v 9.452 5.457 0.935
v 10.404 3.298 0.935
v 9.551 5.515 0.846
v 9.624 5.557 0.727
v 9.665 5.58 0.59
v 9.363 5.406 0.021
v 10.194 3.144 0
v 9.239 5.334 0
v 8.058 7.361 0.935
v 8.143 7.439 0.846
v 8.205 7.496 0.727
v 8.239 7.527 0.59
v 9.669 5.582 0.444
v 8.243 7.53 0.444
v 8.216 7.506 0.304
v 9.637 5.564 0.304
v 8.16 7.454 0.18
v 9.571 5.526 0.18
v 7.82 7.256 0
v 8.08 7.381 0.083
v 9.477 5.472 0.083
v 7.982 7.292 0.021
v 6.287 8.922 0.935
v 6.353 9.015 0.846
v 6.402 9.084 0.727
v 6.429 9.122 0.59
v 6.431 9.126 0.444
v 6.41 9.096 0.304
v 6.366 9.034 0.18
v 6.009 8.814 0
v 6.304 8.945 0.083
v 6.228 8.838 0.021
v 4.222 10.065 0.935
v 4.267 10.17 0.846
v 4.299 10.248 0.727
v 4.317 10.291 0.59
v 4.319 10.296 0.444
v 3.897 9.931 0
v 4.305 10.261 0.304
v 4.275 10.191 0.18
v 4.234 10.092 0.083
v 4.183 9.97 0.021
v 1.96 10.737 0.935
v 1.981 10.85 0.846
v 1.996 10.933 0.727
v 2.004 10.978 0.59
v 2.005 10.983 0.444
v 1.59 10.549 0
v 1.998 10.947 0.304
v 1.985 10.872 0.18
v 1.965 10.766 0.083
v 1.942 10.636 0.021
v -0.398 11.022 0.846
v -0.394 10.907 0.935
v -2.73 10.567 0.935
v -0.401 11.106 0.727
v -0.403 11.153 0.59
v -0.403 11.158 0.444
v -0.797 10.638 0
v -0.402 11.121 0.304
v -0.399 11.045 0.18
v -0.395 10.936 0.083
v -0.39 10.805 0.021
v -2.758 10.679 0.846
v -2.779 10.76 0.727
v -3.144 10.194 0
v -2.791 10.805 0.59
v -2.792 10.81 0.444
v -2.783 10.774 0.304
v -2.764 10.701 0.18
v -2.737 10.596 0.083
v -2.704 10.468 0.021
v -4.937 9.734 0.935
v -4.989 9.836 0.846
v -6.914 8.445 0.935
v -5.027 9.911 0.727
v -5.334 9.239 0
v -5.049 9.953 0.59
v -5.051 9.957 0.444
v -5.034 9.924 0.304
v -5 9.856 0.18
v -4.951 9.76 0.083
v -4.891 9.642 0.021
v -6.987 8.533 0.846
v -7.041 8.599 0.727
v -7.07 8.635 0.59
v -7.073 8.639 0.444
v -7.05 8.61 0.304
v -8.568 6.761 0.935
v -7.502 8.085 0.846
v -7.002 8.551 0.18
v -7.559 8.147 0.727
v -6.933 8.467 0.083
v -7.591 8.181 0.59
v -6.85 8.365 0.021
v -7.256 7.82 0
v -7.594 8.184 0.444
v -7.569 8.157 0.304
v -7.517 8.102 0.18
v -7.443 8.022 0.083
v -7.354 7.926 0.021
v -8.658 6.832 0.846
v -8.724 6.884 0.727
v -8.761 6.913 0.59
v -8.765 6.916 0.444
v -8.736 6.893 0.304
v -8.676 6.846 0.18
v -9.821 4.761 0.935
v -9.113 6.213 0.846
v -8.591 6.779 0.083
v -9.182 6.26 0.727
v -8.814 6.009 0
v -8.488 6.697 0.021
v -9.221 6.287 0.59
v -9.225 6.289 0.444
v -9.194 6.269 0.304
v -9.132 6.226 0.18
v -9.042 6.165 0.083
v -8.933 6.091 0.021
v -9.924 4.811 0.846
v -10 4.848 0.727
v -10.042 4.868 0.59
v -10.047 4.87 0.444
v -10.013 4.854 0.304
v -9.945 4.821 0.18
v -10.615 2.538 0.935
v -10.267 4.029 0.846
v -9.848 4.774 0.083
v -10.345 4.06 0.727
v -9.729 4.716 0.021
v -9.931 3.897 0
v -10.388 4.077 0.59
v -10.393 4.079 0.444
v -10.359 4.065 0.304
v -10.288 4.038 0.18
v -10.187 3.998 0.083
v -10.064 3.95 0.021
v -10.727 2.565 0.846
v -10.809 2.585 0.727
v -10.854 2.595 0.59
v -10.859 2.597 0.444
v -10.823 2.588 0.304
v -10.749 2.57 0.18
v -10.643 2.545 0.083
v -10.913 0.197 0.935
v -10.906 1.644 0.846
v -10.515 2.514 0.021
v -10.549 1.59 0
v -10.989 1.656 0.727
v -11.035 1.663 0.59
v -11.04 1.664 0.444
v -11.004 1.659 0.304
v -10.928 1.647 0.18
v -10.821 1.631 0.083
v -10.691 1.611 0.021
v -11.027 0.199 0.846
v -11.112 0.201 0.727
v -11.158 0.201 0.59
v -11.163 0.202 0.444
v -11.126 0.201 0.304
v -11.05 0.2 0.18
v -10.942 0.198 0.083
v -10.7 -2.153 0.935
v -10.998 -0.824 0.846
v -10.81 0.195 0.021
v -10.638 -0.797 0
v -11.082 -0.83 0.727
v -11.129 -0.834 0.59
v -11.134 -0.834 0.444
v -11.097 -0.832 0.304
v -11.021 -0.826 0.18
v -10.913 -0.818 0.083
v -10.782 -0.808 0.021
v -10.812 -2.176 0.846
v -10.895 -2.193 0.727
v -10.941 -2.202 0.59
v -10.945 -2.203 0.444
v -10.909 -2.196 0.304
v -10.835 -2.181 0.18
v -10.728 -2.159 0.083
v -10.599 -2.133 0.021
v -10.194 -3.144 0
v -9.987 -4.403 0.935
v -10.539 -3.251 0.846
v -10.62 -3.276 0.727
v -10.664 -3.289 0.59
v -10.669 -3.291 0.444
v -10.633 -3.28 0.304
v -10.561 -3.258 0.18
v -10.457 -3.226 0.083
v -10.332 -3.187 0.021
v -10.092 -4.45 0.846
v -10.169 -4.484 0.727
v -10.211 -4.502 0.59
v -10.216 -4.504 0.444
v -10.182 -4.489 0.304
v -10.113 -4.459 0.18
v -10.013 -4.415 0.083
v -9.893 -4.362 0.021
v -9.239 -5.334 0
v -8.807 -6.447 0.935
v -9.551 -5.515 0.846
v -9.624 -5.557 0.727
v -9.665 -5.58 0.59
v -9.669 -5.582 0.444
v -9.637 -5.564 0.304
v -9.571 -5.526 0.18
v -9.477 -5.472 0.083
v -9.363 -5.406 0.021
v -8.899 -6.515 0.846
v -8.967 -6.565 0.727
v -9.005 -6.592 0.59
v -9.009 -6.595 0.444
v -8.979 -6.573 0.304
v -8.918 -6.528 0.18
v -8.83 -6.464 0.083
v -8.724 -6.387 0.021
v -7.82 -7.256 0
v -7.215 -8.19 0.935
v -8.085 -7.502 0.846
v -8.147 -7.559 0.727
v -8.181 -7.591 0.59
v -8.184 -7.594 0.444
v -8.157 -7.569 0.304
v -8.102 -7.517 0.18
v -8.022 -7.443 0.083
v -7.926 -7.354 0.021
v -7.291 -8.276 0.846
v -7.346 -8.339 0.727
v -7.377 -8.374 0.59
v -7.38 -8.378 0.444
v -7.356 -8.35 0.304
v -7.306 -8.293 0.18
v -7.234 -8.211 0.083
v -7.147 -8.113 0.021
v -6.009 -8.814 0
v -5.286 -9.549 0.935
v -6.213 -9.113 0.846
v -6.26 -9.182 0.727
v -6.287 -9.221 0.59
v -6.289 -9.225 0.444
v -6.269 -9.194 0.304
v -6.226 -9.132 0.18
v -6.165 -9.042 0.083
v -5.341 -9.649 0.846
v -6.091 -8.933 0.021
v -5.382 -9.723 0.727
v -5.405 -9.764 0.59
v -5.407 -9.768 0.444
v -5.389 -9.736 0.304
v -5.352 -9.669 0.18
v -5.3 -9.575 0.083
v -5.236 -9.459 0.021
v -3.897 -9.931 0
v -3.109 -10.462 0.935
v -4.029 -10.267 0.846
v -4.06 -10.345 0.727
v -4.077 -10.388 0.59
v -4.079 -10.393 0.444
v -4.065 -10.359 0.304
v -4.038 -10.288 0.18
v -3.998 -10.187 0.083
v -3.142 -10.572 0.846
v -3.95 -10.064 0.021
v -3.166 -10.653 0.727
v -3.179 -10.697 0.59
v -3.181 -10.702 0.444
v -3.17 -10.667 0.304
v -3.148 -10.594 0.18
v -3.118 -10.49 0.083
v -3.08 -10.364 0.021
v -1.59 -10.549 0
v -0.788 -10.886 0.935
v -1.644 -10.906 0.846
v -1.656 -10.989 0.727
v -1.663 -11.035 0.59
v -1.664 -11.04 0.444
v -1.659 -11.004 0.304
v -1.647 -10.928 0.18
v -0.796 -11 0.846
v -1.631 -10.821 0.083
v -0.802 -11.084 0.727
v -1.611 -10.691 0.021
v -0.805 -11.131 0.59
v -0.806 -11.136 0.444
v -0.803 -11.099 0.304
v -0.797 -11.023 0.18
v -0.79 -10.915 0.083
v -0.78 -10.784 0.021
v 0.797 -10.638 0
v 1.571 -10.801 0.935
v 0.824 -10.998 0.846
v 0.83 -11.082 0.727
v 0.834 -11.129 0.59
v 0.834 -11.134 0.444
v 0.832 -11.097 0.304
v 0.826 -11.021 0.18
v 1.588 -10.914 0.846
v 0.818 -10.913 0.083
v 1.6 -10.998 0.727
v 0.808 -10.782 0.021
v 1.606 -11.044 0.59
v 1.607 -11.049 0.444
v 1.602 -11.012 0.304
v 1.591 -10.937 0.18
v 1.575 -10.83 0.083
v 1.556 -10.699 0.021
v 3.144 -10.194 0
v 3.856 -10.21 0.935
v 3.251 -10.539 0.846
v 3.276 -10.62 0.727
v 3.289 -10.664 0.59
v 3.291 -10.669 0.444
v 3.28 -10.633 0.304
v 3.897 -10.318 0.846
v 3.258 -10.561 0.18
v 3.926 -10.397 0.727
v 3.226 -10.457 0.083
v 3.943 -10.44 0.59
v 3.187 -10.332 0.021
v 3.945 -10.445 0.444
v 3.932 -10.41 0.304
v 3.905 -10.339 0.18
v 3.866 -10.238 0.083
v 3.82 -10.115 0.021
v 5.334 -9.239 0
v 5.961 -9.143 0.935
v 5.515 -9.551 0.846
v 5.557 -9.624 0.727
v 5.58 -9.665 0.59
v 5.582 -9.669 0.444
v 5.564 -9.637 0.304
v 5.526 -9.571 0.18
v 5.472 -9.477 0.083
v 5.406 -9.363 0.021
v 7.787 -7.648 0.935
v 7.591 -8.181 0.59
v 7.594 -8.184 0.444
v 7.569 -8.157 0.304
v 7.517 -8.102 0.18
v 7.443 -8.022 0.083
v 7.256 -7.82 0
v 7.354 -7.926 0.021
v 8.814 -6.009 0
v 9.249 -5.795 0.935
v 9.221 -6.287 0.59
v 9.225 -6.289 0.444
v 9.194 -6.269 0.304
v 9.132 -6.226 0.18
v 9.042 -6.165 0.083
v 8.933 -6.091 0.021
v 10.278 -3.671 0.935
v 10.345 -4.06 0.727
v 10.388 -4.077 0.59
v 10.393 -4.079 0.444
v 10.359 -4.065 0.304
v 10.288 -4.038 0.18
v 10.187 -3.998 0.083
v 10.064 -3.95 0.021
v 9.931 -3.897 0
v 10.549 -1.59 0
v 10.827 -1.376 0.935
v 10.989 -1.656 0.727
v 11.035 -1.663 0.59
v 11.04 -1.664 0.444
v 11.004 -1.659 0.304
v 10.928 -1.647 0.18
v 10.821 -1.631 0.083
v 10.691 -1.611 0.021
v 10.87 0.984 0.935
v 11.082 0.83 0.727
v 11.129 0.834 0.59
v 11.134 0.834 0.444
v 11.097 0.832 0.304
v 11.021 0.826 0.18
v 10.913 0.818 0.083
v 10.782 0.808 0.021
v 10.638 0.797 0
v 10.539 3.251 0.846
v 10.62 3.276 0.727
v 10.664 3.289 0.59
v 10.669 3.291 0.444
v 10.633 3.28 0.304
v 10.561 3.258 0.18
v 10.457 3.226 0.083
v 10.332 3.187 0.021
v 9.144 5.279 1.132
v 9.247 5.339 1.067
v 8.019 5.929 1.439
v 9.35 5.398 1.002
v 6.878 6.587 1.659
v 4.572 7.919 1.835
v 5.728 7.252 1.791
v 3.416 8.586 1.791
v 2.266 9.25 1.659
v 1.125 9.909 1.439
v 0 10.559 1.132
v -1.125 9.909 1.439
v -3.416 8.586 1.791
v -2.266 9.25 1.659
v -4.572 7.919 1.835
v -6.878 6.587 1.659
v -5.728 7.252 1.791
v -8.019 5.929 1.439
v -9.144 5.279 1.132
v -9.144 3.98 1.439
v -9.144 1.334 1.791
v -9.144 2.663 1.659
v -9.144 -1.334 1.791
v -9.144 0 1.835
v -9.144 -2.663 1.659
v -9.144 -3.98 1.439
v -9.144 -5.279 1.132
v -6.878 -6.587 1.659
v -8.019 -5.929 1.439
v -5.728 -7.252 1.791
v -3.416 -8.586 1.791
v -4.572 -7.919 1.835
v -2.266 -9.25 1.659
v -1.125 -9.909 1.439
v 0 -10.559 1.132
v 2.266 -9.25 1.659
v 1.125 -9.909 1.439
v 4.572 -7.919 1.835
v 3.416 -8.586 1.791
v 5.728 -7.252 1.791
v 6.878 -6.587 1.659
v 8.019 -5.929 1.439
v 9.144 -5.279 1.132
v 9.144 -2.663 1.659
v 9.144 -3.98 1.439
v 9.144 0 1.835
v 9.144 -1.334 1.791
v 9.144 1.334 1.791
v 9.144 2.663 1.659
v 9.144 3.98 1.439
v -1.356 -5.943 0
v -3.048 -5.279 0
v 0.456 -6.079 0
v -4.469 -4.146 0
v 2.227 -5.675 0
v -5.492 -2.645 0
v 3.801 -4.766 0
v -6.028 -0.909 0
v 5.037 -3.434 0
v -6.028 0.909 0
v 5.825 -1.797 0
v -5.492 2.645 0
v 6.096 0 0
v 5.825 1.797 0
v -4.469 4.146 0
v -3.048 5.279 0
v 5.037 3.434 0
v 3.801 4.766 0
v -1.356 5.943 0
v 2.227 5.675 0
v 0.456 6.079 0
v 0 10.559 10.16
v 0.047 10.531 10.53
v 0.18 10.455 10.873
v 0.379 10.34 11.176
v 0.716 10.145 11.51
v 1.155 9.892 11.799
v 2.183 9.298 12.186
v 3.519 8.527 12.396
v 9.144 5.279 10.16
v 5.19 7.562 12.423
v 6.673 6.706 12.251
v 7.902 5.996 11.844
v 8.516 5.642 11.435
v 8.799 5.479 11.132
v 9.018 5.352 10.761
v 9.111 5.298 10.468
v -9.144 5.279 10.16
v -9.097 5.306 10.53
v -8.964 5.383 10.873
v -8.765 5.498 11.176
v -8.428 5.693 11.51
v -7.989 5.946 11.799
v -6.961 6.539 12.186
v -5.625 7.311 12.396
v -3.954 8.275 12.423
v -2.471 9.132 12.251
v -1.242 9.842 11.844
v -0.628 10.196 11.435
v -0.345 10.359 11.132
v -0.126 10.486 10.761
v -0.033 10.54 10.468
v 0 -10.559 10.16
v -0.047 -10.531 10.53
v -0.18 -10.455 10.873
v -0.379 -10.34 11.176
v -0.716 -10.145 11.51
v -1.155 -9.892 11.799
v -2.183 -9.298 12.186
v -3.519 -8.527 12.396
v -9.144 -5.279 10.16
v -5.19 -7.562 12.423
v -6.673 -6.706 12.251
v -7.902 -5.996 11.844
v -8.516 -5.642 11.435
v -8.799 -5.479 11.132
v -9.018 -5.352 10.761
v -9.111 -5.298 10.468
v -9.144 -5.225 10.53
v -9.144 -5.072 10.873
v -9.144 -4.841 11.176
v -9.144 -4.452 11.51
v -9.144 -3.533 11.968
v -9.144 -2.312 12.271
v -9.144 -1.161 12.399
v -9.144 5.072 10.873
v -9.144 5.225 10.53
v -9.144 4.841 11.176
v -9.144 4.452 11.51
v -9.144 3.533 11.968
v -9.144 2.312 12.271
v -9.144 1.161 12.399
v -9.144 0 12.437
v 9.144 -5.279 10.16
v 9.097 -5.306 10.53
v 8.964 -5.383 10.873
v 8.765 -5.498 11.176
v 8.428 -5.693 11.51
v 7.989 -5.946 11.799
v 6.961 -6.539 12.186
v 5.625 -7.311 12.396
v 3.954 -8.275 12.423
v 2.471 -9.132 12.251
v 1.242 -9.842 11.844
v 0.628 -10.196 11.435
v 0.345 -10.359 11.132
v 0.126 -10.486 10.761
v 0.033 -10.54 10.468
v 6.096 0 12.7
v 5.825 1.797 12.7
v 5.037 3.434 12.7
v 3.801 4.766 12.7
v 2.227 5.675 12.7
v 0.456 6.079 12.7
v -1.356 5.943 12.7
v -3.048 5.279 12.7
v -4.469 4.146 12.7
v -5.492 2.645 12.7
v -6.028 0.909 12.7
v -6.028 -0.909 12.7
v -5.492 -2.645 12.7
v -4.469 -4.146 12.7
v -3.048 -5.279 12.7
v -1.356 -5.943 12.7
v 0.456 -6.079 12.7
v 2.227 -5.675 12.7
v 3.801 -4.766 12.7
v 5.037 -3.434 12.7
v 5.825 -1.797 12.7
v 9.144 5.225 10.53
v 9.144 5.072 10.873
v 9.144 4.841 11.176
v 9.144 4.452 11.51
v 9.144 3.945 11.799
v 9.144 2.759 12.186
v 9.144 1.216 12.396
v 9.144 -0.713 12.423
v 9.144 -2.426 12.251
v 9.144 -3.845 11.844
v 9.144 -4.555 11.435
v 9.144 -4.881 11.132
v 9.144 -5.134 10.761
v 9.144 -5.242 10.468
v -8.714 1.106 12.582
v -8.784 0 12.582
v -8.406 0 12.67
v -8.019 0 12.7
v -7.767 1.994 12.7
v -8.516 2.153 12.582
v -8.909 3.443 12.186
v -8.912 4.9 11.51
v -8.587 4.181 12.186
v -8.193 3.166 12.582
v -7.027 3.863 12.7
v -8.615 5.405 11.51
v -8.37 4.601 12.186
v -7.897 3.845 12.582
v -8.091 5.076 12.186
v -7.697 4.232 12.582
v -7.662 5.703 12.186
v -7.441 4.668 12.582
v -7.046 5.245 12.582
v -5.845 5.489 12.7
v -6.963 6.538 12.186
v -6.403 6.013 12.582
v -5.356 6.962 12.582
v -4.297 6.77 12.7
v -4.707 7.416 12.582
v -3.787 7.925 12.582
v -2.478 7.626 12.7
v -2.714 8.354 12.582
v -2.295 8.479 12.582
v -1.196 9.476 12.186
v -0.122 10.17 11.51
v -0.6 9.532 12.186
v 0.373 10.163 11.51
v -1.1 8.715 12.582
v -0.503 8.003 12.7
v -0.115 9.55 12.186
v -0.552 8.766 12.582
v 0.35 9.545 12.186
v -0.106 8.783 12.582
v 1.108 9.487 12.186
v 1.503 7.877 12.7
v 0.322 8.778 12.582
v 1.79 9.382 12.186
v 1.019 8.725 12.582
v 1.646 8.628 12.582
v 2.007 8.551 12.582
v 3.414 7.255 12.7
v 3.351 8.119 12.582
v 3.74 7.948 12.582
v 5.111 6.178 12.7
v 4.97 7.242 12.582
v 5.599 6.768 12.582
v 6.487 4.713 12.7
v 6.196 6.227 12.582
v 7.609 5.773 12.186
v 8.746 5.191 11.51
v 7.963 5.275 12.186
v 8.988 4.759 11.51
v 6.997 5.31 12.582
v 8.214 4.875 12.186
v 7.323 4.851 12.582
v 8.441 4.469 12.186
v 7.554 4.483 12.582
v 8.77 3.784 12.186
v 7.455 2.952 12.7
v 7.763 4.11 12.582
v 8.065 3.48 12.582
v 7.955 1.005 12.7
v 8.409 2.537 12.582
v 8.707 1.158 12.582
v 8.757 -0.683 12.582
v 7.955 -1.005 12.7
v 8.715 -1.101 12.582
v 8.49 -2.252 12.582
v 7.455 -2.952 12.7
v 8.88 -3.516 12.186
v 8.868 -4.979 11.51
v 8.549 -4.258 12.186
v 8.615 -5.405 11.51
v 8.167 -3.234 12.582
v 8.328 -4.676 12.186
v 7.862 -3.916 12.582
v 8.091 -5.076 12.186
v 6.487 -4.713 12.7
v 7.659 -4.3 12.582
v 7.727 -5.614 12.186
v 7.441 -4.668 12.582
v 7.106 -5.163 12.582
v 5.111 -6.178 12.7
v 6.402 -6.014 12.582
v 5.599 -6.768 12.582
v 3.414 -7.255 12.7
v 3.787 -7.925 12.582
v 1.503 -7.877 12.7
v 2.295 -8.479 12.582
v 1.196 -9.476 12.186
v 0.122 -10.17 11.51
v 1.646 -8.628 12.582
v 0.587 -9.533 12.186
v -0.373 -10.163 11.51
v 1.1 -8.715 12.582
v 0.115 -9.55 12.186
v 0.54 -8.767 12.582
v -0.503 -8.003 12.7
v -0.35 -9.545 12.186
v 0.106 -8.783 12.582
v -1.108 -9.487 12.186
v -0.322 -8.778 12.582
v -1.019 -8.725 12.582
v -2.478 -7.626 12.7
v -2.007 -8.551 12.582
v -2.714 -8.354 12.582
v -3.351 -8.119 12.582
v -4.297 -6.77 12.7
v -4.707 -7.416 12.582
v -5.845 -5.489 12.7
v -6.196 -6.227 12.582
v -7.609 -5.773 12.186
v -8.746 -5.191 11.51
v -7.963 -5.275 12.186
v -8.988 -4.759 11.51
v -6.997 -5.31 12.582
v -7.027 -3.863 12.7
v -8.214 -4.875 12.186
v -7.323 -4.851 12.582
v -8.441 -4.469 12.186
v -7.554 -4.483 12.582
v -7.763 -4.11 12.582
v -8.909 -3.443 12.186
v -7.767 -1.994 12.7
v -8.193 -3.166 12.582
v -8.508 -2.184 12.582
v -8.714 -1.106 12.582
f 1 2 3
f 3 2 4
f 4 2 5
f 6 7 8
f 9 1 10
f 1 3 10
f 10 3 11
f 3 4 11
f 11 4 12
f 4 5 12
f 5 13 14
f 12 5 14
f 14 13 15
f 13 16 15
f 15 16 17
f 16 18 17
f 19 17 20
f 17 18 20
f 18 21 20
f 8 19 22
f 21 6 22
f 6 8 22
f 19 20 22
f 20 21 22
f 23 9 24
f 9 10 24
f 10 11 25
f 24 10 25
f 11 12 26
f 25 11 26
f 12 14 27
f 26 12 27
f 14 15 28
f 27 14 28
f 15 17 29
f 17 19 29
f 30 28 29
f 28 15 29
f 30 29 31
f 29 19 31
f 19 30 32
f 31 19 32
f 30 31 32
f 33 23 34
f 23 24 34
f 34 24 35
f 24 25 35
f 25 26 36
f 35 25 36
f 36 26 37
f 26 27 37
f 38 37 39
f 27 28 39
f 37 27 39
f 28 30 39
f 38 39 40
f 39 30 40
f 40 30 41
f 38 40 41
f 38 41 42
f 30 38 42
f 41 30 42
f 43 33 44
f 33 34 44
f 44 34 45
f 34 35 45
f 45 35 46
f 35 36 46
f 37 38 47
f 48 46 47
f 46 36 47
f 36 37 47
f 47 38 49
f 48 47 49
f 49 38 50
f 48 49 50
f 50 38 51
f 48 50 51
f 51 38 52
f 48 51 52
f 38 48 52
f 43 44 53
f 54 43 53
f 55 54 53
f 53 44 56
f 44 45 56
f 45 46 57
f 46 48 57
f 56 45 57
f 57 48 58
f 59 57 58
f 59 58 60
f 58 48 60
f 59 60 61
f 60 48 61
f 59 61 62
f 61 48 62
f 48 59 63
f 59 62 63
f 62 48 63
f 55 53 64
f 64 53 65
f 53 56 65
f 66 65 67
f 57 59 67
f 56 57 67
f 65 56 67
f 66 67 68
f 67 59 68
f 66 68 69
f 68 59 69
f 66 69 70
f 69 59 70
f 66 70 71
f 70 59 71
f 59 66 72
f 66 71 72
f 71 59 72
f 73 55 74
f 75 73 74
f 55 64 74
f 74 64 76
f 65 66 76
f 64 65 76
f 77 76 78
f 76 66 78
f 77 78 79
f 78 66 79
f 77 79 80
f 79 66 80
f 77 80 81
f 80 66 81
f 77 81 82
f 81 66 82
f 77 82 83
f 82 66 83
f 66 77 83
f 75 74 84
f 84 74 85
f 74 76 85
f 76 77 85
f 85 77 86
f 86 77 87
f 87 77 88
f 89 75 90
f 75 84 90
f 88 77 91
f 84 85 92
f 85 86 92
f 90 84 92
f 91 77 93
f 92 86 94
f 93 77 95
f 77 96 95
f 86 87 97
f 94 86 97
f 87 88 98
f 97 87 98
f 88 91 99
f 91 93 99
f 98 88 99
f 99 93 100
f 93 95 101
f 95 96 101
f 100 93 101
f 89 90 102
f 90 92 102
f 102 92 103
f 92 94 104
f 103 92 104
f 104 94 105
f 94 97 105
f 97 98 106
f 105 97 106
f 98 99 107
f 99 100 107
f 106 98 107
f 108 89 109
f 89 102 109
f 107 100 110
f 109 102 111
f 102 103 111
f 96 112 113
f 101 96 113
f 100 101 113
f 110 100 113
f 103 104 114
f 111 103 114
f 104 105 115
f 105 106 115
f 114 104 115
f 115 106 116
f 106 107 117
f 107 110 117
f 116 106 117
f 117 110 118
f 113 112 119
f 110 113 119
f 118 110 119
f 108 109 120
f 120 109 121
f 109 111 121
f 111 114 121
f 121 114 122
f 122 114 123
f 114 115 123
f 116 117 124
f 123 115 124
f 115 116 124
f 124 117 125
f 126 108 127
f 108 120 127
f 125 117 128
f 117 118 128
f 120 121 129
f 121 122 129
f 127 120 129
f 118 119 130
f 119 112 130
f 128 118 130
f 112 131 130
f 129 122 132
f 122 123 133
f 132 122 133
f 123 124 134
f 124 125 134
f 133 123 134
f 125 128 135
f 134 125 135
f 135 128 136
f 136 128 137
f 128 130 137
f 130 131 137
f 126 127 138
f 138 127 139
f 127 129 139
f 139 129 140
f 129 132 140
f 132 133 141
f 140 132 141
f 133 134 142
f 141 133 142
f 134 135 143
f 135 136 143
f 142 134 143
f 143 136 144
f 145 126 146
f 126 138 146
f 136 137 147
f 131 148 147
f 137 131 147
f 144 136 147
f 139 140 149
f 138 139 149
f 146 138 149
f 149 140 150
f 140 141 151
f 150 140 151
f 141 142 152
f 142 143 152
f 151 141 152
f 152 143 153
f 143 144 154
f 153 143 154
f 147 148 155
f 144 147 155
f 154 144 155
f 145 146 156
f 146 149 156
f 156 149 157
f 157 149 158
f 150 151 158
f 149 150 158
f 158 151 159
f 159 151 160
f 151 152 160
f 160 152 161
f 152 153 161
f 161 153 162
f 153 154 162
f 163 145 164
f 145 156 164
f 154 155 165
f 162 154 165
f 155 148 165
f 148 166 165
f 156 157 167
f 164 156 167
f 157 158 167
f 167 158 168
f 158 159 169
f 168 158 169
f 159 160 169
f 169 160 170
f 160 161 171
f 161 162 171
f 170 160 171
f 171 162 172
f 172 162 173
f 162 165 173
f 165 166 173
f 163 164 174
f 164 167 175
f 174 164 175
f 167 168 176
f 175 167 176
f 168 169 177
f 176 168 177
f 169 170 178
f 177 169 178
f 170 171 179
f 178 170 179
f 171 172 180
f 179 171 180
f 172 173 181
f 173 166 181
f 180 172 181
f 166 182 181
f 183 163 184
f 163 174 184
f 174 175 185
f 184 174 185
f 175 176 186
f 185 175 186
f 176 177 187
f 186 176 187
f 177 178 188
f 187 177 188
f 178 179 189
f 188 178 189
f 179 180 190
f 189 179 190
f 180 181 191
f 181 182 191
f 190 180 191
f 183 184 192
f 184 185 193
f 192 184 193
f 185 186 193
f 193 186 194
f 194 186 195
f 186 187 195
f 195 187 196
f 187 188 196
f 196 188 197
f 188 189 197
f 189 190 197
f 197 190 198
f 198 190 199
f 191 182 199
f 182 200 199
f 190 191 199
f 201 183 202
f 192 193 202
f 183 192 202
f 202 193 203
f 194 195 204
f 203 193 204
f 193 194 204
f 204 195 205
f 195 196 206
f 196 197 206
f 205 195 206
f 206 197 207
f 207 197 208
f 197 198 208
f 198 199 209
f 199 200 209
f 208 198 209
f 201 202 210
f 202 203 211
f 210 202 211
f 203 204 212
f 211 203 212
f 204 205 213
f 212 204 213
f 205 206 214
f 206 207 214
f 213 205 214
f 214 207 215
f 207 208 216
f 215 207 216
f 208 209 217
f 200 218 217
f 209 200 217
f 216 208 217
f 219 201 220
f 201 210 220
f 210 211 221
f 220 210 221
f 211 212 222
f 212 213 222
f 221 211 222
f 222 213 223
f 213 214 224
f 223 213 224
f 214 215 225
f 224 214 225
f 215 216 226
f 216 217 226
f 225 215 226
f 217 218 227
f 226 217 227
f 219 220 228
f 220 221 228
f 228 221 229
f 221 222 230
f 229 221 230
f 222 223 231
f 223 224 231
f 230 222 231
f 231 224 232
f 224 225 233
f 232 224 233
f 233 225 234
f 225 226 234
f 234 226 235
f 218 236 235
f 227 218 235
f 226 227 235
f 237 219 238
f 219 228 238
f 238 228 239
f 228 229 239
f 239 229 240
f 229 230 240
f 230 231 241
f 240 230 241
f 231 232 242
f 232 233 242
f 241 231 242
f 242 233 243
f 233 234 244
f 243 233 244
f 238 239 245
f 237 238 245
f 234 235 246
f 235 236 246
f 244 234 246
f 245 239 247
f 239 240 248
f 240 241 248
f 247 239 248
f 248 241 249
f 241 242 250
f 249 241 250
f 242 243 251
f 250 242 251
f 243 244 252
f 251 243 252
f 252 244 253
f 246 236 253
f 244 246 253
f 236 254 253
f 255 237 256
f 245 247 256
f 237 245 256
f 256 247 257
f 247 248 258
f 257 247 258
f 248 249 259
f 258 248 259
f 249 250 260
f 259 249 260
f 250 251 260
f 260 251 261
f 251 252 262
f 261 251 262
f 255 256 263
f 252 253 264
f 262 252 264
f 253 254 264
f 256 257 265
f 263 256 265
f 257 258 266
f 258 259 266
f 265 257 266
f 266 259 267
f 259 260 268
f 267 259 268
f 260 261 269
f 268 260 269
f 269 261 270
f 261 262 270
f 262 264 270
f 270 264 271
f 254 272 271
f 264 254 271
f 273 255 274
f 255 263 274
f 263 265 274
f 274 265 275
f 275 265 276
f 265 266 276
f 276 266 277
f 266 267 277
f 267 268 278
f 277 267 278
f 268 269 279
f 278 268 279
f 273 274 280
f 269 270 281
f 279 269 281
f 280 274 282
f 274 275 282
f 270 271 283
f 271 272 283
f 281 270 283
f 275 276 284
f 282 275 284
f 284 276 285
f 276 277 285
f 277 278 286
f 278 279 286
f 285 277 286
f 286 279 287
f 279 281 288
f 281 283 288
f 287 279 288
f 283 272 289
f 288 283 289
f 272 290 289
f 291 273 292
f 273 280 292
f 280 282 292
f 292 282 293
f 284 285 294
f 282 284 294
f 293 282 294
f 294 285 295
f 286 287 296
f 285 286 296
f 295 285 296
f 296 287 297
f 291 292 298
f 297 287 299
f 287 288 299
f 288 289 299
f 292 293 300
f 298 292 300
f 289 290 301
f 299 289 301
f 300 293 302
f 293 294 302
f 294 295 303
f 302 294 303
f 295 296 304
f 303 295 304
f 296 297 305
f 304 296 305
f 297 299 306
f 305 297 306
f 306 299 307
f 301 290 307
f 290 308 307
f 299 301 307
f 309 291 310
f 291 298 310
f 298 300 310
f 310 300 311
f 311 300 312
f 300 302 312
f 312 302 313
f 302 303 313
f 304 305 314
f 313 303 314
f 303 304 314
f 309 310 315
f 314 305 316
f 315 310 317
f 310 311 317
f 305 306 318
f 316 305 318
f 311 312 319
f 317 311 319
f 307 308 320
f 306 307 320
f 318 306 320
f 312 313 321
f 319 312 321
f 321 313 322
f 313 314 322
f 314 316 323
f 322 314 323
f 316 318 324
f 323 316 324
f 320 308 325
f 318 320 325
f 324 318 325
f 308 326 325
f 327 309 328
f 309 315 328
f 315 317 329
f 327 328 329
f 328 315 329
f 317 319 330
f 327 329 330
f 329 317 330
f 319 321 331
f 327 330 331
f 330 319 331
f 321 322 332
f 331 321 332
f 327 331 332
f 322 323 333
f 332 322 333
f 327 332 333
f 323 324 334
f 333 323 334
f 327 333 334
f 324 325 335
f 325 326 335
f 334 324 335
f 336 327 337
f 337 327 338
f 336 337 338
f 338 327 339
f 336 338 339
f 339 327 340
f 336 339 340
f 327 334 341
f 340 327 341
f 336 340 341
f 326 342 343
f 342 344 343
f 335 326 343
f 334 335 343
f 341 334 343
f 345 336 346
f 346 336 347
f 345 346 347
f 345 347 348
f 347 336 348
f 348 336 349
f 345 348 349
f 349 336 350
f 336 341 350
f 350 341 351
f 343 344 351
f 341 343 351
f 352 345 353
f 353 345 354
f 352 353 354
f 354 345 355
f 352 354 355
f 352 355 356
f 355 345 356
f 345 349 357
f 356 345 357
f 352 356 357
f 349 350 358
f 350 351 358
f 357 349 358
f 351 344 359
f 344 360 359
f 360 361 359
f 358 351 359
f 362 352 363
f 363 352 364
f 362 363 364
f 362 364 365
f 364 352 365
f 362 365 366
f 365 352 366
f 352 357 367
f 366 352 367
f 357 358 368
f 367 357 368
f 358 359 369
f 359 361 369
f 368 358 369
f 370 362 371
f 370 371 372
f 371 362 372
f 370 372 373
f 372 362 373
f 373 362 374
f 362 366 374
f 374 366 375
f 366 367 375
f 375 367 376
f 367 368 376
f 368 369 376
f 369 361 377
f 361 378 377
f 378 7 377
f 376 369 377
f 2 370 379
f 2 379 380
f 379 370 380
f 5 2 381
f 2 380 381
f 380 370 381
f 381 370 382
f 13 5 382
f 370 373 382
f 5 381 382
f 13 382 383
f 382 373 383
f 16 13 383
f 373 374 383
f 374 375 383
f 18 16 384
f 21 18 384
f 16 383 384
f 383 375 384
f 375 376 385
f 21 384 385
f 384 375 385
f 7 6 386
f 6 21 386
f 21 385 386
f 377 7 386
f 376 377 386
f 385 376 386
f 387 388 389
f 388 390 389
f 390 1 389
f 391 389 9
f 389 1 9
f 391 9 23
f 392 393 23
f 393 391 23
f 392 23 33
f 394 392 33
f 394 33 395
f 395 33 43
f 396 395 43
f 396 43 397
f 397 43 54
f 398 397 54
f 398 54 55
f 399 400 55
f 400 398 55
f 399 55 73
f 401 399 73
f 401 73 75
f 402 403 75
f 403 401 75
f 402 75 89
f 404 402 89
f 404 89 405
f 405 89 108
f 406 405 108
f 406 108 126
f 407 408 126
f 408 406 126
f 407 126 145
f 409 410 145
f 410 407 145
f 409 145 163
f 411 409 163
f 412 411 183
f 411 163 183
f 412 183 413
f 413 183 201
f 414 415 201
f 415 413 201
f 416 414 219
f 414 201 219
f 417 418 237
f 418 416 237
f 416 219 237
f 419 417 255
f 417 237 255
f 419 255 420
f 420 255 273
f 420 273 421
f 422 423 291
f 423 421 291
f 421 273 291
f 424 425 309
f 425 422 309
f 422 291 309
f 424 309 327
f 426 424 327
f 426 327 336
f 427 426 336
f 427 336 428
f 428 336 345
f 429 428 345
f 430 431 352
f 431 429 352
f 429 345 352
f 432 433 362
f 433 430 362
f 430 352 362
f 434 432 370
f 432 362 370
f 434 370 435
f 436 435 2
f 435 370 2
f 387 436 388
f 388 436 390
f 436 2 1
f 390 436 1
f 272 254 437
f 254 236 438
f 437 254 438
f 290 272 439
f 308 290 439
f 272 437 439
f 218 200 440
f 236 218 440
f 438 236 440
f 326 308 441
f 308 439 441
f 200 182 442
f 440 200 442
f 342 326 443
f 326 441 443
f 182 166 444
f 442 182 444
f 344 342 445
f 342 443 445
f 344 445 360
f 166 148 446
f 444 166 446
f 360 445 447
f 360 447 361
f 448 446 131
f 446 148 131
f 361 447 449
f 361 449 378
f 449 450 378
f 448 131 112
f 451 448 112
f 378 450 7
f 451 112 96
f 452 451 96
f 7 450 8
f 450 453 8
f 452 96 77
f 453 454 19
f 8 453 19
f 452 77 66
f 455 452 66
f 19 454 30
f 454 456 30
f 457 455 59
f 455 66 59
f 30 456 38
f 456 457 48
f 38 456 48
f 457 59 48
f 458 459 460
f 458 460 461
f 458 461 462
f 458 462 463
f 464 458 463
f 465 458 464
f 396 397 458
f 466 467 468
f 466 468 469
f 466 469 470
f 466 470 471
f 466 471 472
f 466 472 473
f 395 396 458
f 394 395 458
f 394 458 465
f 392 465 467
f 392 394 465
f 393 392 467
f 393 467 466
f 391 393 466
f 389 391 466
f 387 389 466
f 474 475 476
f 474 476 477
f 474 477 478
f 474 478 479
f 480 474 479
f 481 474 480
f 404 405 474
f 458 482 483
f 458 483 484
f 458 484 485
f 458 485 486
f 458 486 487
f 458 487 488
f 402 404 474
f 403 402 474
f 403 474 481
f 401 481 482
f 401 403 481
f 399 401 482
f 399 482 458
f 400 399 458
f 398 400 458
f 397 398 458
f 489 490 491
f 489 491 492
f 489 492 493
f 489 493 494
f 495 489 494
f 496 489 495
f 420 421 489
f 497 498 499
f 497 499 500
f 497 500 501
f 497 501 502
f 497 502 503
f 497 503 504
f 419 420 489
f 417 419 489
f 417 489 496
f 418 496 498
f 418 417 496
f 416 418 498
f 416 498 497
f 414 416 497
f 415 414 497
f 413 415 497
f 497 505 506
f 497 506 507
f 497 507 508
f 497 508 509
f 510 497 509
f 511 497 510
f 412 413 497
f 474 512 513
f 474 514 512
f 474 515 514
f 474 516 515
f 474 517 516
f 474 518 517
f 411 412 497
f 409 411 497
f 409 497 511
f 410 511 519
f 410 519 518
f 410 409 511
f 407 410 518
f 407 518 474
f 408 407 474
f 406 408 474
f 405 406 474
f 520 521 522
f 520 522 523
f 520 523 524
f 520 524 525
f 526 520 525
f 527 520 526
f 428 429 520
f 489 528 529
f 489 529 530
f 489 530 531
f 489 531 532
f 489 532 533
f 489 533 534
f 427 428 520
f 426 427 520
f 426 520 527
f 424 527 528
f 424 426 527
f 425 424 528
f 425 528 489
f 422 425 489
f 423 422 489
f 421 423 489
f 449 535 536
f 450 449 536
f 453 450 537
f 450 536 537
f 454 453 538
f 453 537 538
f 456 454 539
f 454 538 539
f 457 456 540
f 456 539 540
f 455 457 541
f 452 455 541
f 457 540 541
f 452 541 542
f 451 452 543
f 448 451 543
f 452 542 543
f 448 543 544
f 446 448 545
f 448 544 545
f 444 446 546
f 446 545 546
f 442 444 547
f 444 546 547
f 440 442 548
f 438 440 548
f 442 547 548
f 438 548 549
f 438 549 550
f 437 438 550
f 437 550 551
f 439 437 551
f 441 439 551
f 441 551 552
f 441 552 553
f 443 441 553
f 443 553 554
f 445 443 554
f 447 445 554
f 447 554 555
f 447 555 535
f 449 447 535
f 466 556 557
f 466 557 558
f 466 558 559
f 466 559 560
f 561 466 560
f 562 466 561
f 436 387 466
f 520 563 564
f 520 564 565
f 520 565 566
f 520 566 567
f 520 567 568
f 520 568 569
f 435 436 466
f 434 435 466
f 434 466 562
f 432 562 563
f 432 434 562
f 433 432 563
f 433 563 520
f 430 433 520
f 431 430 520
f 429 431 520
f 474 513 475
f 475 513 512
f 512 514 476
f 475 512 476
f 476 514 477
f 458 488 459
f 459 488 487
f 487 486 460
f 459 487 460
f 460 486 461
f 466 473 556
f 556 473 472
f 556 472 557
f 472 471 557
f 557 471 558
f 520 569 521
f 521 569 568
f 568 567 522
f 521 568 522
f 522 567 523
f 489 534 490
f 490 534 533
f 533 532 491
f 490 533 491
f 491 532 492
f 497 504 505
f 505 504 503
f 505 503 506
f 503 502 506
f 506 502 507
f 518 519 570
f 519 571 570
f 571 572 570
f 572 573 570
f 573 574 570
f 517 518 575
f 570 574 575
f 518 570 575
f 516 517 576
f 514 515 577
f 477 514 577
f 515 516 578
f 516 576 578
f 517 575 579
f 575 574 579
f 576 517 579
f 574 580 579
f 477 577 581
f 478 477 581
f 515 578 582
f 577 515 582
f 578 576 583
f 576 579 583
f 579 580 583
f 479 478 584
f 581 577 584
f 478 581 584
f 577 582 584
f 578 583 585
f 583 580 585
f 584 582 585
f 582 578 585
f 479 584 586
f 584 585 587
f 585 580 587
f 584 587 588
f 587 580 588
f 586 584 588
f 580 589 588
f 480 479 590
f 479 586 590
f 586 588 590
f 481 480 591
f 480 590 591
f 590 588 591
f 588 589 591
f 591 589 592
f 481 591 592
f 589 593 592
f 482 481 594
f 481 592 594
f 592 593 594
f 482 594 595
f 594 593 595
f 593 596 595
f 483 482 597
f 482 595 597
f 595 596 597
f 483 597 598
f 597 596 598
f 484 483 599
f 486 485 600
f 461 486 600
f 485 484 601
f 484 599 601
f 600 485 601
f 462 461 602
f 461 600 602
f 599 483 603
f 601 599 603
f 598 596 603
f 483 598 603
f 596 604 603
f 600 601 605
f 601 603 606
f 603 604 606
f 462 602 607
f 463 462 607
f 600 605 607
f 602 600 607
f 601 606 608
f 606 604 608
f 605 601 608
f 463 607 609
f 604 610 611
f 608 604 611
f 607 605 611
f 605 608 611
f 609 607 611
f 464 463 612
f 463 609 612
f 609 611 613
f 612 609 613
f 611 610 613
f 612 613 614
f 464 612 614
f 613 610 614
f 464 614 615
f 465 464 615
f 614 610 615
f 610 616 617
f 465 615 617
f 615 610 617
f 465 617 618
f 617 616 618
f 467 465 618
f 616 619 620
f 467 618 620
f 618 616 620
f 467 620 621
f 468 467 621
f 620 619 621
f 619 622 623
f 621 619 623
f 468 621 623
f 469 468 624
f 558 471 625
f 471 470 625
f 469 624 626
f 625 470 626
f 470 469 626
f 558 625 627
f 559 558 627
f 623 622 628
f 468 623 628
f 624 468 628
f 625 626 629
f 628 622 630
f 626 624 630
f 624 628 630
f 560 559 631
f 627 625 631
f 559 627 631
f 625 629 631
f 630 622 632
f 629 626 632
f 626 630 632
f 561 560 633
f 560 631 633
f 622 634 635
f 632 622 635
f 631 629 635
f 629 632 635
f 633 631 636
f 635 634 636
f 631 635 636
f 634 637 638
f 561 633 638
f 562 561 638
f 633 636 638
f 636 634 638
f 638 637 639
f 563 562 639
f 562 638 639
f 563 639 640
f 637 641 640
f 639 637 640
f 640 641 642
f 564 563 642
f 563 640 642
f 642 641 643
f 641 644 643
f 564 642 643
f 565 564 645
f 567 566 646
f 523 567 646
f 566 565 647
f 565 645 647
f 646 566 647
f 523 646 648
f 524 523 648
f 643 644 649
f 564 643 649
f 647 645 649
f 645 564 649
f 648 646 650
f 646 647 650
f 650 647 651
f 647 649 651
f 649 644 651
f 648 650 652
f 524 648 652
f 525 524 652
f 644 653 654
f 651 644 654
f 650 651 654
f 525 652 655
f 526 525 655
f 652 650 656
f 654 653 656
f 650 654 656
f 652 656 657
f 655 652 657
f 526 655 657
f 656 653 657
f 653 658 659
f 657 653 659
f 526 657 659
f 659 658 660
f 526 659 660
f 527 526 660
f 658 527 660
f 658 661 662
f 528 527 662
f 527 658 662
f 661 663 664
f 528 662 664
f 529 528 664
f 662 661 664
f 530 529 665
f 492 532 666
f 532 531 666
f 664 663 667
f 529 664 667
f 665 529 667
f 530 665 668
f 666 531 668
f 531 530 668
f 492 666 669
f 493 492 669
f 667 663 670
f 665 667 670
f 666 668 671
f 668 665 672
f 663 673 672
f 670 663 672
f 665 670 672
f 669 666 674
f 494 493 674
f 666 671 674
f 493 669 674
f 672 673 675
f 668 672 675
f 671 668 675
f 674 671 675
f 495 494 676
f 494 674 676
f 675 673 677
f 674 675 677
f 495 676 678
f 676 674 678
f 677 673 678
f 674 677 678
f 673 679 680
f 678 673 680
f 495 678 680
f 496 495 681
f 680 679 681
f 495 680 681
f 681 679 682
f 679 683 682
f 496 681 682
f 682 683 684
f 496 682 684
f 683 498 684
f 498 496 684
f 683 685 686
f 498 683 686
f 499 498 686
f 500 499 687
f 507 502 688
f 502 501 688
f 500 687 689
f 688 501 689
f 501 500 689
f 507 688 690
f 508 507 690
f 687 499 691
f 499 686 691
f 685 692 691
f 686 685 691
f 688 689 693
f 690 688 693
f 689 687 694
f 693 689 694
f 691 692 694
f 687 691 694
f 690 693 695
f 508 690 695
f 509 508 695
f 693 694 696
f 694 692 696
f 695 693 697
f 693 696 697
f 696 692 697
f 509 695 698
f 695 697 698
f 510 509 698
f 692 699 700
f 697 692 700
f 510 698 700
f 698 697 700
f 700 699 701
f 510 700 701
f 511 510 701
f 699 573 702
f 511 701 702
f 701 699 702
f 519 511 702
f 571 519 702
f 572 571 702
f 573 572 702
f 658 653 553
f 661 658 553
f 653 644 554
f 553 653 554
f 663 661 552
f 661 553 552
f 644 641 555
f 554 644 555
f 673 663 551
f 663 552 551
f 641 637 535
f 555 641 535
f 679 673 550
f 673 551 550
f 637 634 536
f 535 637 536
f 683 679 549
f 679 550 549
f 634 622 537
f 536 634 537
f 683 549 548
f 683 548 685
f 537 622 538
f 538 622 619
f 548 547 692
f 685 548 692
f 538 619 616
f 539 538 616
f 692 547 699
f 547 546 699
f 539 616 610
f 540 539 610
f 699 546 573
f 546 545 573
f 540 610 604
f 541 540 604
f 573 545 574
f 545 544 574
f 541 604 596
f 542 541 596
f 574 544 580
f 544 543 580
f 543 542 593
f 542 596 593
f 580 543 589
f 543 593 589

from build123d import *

# Parameters (mm, degrees)
HEAD_DEPTH         = 12.7
HOLE_SKETCH_R      = 6.096
THROUGH_HOLE_DEPTH = 21.266683312


with BuildPart() as part:
    # Head Sketch → Head (new body)
    with BuildSketch(Plane.XY):
        Polygon((0, 10.558581723), (9.144, 5.279290861), (9.144, -5.279290861), (0, -10.558581723), (-9.144, -5.279290861), (-9.144, 5.279290861), align=None)
    extrude(amount=HEAD_DEPTH)

    # Flange Sketch → Flange (revolve)
    with BuildSketch(Plane(origin=(0, 0, 0), x_dir=(-1, 0, 0), z_dir=(0, 1, 0)), mode=Mode.PRIVATE) as flange_sk:
        with BuildLine():
            Line((-10.668, 0), (0, 0))
            Line((0, 0), (0, 3.81))
            ThreePointArc((0, 3.81), (-5.643297007, 3.079227926), (-10.91431477, 0.935119563))
            ThreePointArc((-10.91431477, 0.935119563), (-11.151507901, 0.372641807), (-10.668, 0))
        make_face()
    revolve(flange_sk.sketch.rotate(Axis((0, 0, 1.843425858), (0, 0, 1)), 30), axis=Axis((0, 0, 1.843425858), (0, 0, 1)))

    # Sketch5 → Head Trim (revolve, cut)
    with BuildSketch(Plane(origin=(0, 0, 0), x_dir=(0, 0, -1), z_dir=(1, 0, 0)), mode=Mode.PRIVATE) as head_trim_sk:
        with BuildLine():
            Line((-12.7, -8.018581723), (-12.7, -10.558581723))
            Line((-12.7, -10.558581723), (-10.16, -10.558581723))
            ThreePointArc((-10.16, -10.558581723), (-11.956051224, -9.814632947), (-12.7, -8.018581723))
        make_face()
    revolve(head_trim_sk.sketch.rotate(Axis((0, 0, 15.085599173), (0, 0, -1)), 90), axis=Axis((0, 0, 15.085599173), (0, 0, -1)), mode=Mode.SUBTRACT)

    # Hole Sketch → Through Hole (cut, through all)
    with BuildSketch(Plane.XY.offset(12.7)):
        Circle(HOLE_SKETCH_R)
    extrude(amount=-THROUGH_HOLE_DEPTH, mode=Mode.SUBTRACT)


solid = part.part
